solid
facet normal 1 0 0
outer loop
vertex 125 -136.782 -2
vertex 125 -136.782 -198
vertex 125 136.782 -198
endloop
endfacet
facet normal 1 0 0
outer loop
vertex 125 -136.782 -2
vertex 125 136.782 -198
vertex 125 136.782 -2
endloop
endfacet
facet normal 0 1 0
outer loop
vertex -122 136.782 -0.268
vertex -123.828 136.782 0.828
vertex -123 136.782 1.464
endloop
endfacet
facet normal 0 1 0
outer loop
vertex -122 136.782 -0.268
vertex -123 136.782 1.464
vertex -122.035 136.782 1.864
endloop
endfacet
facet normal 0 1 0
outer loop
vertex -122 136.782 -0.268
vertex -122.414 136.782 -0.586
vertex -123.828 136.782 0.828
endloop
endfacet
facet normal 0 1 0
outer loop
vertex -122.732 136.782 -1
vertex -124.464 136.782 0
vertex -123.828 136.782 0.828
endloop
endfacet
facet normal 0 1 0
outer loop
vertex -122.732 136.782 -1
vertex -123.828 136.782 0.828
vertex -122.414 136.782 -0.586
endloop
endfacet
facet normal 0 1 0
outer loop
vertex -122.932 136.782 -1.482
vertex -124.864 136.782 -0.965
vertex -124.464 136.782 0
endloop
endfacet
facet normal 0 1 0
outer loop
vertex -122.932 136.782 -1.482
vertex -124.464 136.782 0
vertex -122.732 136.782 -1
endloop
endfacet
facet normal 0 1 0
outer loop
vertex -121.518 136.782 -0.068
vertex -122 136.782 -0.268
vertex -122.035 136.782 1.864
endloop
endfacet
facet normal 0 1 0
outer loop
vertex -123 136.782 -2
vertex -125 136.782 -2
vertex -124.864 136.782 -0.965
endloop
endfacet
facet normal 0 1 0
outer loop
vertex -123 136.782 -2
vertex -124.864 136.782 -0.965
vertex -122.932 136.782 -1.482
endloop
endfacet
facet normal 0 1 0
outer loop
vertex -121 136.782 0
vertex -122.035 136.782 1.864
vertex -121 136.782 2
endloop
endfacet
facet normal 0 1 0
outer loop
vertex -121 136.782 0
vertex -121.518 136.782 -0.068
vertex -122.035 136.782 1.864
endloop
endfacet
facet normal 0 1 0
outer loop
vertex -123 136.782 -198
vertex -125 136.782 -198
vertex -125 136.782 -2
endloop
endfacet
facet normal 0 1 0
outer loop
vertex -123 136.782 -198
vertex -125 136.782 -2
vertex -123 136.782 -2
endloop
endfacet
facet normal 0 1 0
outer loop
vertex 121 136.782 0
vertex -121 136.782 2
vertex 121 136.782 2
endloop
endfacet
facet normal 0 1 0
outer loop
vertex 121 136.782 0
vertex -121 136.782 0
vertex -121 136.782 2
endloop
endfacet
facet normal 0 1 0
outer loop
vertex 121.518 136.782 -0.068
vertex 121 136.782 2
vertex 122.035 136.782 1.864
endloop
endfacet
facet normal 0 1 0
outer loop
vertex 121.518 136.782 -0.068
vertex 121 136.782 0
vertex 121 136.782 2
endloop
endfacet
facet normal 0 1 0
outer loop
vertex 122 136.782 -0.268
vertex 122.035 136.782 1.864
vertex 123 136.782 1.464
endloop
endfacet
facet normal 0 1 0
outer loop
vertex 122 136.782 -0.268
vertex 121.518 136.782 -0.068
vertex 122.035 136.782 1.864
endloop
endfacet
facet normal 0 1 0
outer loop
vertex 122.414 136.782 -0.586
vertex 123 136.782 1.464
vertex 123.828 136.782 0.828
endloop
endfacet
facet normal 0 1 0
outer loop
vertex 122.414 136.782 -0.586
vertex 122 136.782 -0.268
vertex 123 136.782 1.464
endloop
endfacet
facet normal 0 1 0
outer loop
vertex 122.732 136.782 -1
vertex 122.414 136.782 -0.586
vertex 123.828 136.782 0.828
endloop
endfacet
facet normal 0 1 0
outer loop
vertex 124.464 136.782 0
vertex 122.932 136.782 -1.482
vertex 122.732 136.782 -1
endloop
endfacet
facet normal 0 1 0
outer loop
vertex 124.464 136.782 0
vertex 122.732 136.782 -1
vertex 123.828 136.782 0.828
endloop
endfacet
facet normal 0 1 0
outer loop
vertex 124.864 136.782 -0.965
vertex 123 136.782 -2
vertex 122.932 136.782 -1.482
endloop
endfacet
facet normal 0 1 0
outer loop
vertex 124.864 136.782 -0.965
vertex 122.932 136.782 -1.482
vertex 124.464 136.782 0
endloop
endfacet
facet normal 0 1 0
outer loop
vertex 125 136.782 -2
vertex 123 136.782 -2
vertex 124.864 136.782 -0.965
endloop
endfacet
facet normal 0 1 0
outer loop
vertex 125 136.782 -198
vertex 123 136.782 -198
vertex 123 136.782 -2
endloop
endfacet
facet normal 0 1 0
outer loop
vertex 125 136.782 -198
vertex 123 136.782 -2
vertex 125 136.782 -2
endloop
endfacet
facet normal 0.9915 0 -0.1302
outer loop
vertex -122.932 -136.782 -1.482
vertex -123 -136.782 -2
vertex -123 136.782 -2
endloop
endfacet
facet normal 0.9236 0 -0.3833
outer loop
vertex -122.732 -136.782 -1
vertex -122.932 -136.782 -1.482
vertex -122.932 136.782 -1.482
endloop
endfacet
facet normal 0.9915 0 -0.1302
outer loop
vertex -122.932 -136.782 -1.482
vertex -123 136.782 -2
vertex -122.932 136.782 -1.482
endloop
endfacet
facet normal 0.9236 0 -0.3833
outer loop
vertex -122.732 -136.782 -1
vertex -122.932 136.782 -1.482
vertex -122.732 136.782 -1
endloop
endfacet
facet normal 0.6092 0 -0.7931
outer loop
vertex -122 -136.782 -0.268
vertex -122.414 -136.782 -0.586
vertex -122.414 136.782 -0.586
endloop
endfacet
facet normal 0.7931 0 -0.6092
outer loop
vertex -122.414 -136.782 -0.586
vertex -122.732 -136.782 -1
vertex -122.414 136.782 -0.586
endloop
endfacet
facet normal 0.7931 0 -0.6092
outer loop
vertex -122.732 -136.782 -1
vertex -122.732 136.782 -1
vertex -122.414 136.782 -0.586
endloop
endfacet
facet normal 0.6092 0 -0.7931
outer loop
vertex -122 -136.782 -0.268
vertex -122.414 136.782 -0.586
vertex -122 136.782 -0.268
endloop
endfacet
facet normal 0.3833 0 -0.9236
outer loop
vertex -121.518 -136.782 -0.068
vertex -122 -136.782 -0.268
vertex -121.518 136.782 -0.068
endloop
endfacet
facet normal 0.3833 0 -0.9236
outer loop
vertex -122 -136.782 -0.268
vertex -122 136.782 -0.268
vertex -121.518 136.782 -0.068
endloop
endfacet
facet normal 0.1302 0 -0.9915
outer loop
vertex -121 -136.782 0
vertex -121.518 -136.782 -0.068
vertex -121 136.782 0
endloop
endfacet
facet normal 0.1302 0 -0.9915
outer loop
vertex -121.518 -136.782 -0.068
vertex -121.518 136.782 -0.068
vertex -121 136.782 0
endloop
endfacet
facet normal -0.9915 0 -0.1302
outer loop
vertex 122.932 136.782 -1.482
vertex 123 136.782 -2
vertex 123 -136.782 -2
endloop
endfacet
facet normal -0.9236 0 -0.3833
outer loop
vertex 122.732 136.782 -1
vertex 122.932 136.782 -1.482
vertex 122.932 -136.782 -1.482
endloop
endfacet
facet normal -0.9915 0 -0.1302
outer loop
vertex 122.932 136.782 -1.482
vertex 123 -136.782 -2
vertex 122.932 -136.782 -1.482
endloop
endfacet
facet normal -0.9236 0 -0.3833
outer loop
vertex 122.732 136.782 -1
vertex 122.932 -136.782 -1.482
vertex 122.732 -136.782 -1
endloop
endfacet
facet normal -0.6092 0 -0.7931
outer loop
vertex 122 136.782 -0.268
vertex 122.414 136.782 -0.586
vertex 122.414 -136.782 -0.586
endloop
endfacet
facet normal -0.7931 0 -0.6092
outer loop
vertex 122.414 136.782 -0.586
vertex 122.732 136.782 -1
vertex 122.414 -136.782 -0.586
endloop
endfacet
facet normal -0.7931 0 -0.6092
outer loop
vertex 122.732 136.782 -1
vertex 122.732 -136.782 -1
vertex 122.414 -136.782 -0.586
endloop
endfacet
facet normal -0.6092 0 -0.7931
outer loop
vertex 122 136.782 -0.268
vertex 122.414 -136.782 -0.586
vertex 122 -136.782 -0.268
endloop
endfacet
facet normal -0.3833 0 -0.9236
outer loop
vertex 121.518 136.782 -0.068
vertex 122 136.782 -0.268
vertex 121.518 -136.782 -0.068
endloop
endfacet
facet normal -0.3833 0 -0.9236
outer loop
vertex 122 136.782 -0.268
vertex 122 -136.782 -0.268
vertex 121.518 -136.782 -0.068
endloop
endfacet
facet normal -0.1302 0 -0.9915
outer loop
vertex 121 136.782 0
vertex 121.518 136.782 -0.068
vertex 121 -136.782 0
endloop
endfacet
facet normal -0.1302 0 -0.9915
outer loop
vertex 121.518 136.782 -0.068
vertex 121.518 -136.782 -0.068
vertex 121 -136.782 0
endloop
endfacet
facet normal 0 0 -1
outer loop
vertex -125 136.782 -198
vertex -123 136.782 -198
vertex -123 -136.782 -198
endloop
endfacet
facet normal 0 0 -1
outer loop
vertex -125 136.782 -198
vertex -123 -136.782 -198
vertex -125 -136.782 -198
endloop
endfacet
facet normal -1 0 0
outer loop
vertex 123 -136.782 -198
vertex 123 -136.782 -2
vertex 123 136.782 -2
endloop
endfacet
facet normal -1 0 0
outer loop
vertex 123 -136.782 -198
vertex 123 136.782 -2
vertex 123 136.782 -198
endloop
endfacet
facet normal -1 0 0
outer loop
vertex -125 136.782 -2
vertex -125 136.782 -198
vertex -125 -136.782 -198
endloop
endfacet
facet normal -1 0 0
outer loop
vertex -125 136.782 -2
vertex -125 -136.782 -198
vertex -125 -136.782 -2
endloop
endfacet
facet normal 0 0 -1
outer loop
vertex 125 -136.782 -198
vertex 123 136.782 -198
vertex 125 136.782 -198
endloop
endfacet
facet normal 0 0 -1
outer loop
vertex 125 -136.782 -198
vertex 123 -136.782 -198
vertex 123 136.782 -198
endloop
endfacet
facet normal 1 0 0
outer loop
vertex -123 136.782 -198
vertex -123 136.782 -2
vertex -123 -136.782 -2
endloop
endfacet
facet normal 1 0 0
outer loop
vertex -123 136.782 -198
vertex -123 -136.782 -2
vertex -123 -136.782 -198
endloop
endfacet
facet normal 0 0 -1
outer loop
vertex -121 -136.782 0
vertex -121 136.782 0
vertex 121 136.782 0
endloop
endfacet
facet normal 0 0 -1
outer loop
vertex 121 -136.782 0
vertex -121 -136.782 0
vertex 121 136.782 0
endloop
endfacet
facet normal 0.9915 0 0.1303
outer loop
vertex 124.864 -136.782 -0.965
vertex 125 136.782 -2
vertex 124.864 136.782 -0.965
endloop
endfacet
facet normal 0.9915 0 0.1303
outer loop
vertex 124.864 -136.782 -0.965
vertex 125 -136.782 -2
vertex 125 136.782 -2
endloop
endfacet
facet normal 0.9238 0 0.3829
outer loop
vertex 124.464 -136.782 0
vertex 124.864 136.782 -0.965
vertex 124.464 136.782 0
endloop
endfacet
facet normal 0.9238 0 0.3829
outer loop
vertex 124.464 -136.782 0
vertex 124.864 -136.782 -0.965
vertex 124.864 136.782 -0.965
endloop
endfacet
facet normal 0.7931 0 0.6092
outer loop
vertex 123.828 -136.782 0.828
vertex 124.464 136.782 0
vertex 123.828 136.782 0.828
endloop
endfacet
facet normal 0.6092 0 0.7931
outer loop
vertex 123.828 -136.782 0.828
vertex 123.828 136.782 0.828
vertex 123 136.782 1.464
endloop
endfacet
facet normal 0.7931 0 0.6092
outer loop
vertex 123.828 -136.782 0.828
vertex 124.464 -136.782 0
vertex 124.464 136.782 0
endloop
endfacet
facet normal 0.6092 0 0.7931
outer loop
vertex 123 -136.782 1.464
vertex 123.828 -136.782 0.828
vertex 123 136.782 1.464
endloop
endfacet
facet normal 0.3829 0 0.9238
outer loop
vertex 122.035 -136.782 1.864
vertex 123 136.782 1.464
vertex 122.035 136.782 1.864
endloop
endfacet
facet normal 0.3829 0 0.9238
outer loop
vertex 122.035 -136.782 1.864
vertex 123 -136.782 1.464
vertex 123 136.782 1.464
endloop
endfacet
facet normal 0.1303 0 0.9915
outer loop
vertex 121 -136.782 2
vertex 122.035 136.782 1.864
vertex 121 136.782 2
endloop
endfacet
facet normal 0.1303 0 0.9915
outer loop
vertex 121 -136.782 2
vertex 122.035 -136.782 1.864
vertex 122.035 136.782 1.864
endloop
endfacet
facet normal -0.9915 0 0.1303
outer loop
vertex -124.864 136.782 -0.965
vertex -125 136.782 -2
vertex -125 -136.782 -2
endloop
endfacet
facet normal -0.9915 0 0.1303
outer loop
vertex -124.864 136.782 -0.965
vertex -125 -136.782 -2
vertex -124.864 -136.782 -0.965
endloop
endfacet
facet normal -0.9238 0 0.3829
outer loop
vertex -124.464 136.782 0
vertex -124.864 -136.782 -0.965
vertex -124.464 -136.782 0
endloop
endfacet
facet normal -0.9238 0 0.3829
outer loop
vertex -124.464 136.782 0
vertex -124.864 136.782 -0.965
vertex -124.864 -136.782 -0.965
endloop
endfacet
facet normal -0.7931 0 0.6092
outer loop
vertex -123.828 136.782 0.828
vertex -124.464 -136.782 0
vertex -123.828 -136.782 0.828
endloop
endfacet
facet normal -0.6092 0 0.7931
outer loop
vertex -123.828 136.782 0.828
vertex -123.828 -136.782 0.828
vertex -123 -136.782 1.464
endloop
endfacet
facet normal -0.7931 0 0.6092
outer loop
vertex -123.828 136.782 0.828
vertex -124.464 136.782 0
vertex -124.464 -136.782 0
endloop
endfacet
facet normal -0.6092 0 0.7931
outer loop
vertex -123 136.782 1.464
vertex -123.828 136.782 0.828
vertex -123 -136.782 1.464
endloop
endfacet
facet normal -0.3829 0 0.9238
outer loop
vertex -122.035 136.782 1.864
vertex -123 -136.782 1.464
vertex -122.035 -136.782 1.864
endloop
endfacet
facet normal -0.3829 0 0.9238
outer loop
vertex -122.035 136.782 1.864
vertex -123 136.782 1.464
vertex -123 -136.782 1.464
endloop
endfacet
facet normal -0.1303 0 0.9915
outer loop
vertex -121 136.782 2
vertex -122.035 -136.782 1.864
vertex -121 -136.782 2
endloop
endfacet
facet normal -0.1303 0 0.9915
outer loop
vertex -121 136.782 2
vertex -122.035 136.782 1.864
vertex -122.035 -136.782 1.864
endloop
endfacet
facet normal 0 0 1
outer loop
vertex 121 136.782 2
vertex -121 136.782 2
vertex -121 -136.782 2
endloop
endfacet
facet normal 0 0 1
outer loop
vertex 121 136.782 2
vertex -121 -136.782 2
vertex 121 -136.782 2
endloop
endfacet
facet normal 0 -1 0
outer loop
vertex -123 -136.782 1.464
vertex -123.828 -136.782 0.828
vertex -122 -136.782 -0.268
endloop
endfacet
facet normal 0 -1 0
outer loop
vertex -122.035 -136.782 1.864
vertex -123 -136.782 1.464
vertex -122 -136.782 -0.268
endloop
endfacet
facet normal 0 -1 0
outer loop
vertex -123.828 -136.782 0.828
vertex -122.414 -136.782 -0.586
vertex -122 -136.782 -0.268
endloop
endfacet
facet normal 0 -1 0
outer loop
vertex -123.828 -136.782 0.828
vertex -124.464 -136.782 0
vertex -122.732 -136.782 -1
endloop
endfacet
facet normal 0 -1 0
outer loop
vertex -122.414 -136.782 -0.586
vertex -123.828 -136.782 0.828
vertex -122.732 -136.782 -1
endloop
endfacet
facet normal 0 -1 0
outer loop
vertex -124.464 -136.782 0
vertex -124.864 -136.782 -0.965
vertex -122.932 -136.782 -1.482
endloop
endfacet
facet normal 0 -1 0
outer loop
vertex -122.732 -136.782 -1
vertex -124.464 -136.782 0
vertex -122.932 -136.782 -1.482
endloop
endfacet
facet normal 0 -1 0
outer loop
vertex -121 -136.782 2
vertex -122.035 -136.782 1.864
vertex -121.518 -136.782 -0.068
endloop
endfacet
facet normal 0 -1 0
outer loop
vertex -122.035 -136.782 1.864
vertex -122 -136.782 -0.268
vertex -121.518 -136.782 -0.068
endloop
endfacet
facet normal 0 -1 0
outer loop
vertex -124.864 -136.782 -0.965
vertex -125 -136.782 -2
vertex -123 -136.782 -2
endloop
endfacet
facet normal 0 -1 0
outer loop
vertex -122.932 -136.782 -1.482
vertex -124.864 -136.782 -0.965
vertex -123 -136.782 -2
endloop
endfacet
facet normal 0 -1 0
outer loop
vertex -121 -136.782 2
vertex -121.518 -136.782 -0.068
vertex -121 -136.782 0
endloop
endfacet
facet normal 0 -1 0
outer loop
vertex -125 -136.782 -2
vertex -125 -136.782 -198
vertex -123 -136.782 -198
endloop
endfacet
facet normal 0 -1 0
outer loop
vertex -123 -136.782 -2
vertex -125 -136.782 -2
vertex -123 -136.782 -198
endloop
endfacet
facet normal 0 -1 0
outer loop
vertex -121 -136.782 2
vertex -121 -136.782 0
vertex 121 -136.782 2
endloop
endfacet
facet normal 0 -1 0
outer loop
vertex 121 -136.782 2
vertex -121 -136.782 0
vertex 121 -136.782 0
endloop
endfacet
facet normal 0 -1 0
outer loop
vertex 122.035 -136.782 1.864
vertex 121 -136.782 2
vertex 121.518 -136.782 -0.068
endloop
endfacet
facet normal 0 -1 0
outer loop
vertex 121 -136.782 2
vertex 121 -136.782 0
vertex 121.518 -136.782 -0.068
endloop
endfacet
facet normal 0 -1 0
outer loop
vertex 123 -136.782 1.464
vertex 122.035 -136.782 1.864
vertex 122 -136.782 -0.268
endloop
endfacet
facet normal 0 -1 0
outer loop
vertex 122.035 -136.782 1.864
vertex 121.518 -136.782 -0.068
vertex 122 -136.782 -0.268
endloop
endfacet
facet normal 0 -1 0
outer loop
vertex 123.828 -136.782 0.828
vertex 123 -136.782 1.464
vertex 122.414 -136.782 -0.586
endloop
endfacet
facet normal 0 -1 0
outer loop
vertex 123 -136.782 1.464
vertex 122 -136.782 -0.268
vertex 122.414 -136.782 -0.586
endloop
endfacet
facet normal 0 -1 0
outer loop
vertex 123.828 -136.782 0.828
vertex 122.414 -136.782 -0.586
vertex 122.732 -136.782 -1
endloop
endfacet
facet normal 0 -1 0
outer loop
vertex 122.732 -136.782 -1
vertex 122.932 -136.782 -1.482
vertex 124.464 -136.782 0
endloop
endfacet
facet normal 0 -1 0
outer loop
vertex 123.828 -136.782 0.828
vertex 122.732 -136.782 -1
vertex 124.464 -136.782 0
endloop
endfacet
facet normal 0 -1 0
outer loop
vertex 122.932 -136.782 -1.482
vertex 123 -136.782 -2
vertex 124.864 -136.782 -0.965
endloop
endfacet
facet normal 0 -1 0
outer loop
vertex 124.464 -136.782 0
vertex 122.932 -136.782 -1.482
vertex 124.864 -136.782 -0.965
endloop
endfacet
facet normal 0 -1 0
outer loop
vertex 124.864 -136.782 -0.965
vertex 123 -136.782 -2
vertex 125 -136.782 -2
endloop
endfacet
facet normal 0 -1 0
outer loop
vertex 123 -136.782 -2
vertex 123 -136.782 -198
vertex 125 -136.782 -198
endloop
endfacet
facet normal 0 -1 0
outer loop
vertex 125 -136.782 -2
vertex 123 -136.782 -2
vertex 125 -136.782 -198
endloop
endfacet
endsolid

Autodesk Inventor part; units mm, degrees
ref_plane "YZ Plane" through (0, 0, 0) normal (1, 0, 0) x (0, 1, 0)
ref_plane "XZ Plane" through (0, 0, 0) normal (0, 1, 0) x (-1, 0, 0)
ref_plane "XY Plane" through (0, 0, 0) normal (0, 0, 1) x (1, 0, 0)
sketch "Sketch1" plane through (0, 0, 0) normal (0, 0, 1) x (1, 0, 0)
  line L0 (125, -136.782) -> (-125, -136.782)
  line L1 (-125, -136.782) -> (-125, 136.782)
  line L2 (-125, 136.782) -> (125, 136.782)
  line L3 (125, 136.782) -> (125, -136.782)
  line L4 (125, -136.782) -> (-125, 136.782) construction
  line L5 (-125, -136.782) -> (125, 136.782) construction
  point P0 (0, 0)
  dimension "d1" = 250
extrude "Plate1" add sketch "Sketch1" along normal blind 2
sketch "Sketch2" plane through (123, -136.782, 2) normal (1, 0, 0) x (0, 1, 0)
  line L0 (273.5641, 0) -> (0, 0)
  line L1 (0, 0) -> (0, -200)
  line L2 (0, -200) -> (273.5641, -200)
  line L3 (273.5641, -200) -> (273.5641, 0)
edge flange "Flange1" height 200 angle 90 thickness 2 bend radius 2 thickness toward (1, 0, 0) relief tear relief width 2 relief depth 1 edges at (125, 0, 0) wall of the first edge with corners at (123, 136.782, 2) (123, -136.782, 2) (123, -136.782, -198) (123, 136.782, -198)
bend "Bend1"
corner "Corner1"
sketch "Sketch3" plane through (-123, 136.782, 2) normal (-1, 0, 0) x (0, -1, 0)
  line L0 (273.5641, 0) -> (0, 0)
  line L1 (0, 0) -> (0, -200)
  line L2 (0, -200) -> (273.5641, -200)
  line L3 (273.5641, -200) -> (273.5641, 0)
edge flange "Flange2" height 200 angle 90 thickness 2 bend radius 2 thickness toward (-1, 0, 0) relief tear relief width 2 relief depth 1 edges at (-125, 0, 0) wall of the first edge with corners at (-123, -136.782, 2) (-123, 136.782, 2) (-123, 136.782, -198) (-123, -136.782, -198)
bend "Bend2"
corner "Corner2"
equation "\"d0\" = Thickness"
equation "\"d2\" = BendReliefWidth"
equation "\"d3\" = BendReliefDepth"
equation "\"d4\" = MinimumRemnant"
equation "\"d5\" = TransitionRadius"
equation "\"d8\" = BendRadius"
equation "\"d9\" = CornerReliefSize"
equation "\"d10\" = GapSize"
equation "\"d11\" = JacobiRadiusSize"
equation "\"d12\" = BendReliefWidth"
equation "\"d13\" = BendReliefDepth"
equation "\"d14\" = MinimumRemnant"
equation "\"d15\" = TransitionRadius"
equation "\"d18\" = BendRadius"
equation "\"d19\" = CornerReliefSize"
equation "\"d20\" = GapSize"
equation "\"d21\" = JacobiRadiusSize"
equation "\"BendRadius\" = Thickness"
equation "\"BendReliefWidth\" = Thickness"
equation "\"BendReliefDepth\" = 0.5 * Thickness"
equation "\"CornerReliefSize\" = 4 * Thickness"
equation "\"MinimumRemnant\" = 2 * Thickness"
equation "\"TransitionRadius\" = BendRadius"
equation "\"JacobiRadiusSize\" = BendRadius"
equation "\"GapSize\" = Thickness"
equation "\"Thickness\" = 2"
